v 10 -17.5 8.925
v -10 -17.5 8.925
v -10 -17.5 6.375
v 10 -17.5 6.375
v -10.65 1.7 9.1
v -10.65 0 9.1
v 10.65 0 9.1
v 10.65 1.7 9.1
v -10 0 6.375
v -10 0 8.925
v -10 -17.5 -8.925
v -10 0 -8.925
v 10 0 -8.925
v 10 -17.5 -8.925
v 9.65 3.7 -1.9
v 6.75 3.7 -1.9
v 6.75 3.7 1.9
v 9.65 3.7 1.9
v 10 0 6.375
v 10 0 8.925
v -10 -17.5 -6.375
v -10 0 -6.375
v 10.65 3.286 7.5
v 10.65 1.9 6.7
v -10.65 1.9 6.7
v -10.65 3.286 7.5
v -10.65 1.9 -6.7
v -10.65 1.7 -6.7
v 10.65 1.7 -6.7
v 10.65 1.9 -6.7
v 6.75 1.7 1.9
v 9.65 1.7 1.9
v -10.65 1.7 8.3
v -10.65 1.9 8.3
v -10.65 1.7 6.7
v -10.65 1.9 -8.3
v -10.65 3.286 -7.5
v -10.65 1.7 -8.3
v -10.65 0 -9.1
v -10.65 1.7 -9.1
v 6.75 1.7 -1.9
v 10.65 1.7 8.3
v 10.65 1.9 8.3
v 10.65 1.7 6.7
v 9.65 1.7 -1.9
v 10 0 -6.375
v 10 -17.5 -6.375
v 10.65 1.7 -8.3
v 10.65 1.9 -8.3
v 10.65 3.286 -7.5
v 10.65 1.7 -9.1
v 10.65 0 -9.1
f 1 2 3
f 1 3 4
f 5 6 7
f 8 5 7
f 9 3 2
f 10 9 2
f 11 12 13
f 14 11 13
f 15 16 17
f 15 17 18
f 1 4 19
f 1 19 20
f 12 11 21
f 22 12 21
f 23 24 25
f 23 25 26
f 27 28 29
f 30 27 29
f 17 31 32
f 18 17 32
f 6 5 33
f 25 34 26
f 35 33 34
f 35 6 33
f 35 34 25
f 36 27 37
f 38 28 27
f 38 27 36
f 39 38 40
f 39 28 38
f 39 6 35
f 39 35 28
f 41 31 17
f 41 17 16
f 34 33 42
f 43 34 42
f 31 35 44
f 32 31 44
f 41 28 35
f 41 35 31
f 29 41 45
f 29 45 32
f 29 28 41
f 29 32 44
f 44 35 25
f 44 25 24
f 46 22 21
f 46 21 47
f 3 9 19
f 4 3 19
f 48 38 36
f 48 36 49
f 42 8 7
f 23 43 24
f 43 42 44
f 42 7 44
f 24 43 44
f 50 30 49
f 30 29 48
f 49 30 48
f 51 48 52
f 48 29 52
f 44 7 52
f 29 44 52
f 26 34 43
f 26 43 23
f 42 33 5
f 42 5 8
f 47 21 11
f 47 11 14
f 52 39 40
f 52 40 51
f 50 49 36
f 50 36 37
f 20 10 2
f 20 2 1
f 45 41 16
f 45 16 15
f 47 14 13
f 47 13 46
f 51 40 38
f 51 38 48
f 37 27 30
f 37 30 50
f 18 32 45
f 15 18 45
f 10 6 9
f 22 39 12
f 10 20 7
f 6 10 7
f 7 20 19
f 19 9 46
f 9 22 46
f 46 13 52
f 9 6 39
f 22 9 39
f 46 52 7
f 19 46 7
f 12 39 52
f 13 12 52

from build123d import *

# Parameters (mm, degrees)
SKETCH_2_W       = 21.3
SKETCH_2_H       = 18.2
EXTRUDE_1_DEPTH  = 1.7
SKETCH_4_W       = 21.3
SKETCH_4_H       = 1.6
EXTRUDE_2_DEPTH  = 1.6
CHAMFER_1_SIZE   = 1.4
CHAMFER_1_SIZE_2 = 0.808290377
SKETCH_5_W       = 2.9
SKETCH_5_H       = 3.8
EXTRUDE_3_DEPTH  = 2
SKETCH_6_W       = 20
SKETCH_6_H       = 2.55
EXTRUDE_4_DEPTH  = 17.5


with BuildPart() as part:
    # 草图2 → 凸台-拉伸1 (new body)
    with BuildSketch(Plane(origin=(0, 0, 0), x_dir=(1, 0, 0), z_dir=(0, 1, 0))):
        Rectangle(SKETCH_2_W, SKETCH_2_H)
    extrude(amount=EXTRUDE_1_DEPTH)

    # 草图4 → 凸台-拉伸2 (add)
    with BuildSketch(Plane(origin=(0, 1.7, 0), x_dir=(1, 0, 0), z_dir=(0, 1, 0))):
        with Locations((0, 7.5)):
            Rectangle(SKETCH_4_W, SKETCH_4_H)
        with Locations((0, -7.5)):
            Rectangle(SKETCH_4_W, SKETCH_4_H)
    extrude(amount=EXTRUDE_2_DEPTH)

    # 倒角1
    # the kernel refuses this chamfer: 1.4, 0.808290377 mm, written as the material it takes off along each edge
    with BuildSketch(Plane(origin=(14.271920057, 3.3, 8.3), x_dir=(0, -0.9998132206222079, 0.019326765612701028), z_dir=(-1, 0, 0)), Plane(origin=(-14.271920057, 3.3, 6.7), x_dir=(0, -0.9998132206222079, -0.019326765612701028), z_dir=(1, 0, 0)), Plane(origin=(14.271920057, 3.3, -6.7), x_dir=(0, -0.9998132206222079, 0.019326765612701028), z_dir=(-1, 0, 0)), Plane(origin=(-14.271920057, 3.3, -8.3), x_dir=(0, -0.9998132206222079, -0.019326765612701028), z_dir=(1, 0, 0))) as chamfer_1_piece_1:
        Polygon((CHAMFER_1_SIZE * 0.999813220622, -CHAMFER_1_SIZE * 0.0193267656127), (-CHAMFER_1_SIZE_2 * 0.0193267656095, -CHAMFER_1_SIZE_2 * 0.999813220456), (0, 0), align=None)
    extrude(amount=28.543840113, mode=Mode.SUBTRACT)

    # 草图5 → 凸台-拉伸3 (add)
    with BuildSketch(Plane(origin=(0, 1.7, 0), x_dir=(1, 0, 0), z_dir=(0, 1, 0))):
        with Locations((8.2, 0)):
            Rectangle(SKETCH_5_W, SKETCH_5_H)
    extrude(amount=EXTRUDE_3_DEPTH)

    # 草图6 → 凸台-拉伸4 (add)
    with BuildSketch(Plane.XZ):
        with Locations((0, -7.65)):
            Rectangle(SKETCH_6_W, SKETCH_6_H)
        with Locations((0, 7.65)):
            Rectangle(SKETCH_6_W, SKETCH_6_H)
    extrude(amount=EXTRUDE_4_DEPTH)


solid = part.part
